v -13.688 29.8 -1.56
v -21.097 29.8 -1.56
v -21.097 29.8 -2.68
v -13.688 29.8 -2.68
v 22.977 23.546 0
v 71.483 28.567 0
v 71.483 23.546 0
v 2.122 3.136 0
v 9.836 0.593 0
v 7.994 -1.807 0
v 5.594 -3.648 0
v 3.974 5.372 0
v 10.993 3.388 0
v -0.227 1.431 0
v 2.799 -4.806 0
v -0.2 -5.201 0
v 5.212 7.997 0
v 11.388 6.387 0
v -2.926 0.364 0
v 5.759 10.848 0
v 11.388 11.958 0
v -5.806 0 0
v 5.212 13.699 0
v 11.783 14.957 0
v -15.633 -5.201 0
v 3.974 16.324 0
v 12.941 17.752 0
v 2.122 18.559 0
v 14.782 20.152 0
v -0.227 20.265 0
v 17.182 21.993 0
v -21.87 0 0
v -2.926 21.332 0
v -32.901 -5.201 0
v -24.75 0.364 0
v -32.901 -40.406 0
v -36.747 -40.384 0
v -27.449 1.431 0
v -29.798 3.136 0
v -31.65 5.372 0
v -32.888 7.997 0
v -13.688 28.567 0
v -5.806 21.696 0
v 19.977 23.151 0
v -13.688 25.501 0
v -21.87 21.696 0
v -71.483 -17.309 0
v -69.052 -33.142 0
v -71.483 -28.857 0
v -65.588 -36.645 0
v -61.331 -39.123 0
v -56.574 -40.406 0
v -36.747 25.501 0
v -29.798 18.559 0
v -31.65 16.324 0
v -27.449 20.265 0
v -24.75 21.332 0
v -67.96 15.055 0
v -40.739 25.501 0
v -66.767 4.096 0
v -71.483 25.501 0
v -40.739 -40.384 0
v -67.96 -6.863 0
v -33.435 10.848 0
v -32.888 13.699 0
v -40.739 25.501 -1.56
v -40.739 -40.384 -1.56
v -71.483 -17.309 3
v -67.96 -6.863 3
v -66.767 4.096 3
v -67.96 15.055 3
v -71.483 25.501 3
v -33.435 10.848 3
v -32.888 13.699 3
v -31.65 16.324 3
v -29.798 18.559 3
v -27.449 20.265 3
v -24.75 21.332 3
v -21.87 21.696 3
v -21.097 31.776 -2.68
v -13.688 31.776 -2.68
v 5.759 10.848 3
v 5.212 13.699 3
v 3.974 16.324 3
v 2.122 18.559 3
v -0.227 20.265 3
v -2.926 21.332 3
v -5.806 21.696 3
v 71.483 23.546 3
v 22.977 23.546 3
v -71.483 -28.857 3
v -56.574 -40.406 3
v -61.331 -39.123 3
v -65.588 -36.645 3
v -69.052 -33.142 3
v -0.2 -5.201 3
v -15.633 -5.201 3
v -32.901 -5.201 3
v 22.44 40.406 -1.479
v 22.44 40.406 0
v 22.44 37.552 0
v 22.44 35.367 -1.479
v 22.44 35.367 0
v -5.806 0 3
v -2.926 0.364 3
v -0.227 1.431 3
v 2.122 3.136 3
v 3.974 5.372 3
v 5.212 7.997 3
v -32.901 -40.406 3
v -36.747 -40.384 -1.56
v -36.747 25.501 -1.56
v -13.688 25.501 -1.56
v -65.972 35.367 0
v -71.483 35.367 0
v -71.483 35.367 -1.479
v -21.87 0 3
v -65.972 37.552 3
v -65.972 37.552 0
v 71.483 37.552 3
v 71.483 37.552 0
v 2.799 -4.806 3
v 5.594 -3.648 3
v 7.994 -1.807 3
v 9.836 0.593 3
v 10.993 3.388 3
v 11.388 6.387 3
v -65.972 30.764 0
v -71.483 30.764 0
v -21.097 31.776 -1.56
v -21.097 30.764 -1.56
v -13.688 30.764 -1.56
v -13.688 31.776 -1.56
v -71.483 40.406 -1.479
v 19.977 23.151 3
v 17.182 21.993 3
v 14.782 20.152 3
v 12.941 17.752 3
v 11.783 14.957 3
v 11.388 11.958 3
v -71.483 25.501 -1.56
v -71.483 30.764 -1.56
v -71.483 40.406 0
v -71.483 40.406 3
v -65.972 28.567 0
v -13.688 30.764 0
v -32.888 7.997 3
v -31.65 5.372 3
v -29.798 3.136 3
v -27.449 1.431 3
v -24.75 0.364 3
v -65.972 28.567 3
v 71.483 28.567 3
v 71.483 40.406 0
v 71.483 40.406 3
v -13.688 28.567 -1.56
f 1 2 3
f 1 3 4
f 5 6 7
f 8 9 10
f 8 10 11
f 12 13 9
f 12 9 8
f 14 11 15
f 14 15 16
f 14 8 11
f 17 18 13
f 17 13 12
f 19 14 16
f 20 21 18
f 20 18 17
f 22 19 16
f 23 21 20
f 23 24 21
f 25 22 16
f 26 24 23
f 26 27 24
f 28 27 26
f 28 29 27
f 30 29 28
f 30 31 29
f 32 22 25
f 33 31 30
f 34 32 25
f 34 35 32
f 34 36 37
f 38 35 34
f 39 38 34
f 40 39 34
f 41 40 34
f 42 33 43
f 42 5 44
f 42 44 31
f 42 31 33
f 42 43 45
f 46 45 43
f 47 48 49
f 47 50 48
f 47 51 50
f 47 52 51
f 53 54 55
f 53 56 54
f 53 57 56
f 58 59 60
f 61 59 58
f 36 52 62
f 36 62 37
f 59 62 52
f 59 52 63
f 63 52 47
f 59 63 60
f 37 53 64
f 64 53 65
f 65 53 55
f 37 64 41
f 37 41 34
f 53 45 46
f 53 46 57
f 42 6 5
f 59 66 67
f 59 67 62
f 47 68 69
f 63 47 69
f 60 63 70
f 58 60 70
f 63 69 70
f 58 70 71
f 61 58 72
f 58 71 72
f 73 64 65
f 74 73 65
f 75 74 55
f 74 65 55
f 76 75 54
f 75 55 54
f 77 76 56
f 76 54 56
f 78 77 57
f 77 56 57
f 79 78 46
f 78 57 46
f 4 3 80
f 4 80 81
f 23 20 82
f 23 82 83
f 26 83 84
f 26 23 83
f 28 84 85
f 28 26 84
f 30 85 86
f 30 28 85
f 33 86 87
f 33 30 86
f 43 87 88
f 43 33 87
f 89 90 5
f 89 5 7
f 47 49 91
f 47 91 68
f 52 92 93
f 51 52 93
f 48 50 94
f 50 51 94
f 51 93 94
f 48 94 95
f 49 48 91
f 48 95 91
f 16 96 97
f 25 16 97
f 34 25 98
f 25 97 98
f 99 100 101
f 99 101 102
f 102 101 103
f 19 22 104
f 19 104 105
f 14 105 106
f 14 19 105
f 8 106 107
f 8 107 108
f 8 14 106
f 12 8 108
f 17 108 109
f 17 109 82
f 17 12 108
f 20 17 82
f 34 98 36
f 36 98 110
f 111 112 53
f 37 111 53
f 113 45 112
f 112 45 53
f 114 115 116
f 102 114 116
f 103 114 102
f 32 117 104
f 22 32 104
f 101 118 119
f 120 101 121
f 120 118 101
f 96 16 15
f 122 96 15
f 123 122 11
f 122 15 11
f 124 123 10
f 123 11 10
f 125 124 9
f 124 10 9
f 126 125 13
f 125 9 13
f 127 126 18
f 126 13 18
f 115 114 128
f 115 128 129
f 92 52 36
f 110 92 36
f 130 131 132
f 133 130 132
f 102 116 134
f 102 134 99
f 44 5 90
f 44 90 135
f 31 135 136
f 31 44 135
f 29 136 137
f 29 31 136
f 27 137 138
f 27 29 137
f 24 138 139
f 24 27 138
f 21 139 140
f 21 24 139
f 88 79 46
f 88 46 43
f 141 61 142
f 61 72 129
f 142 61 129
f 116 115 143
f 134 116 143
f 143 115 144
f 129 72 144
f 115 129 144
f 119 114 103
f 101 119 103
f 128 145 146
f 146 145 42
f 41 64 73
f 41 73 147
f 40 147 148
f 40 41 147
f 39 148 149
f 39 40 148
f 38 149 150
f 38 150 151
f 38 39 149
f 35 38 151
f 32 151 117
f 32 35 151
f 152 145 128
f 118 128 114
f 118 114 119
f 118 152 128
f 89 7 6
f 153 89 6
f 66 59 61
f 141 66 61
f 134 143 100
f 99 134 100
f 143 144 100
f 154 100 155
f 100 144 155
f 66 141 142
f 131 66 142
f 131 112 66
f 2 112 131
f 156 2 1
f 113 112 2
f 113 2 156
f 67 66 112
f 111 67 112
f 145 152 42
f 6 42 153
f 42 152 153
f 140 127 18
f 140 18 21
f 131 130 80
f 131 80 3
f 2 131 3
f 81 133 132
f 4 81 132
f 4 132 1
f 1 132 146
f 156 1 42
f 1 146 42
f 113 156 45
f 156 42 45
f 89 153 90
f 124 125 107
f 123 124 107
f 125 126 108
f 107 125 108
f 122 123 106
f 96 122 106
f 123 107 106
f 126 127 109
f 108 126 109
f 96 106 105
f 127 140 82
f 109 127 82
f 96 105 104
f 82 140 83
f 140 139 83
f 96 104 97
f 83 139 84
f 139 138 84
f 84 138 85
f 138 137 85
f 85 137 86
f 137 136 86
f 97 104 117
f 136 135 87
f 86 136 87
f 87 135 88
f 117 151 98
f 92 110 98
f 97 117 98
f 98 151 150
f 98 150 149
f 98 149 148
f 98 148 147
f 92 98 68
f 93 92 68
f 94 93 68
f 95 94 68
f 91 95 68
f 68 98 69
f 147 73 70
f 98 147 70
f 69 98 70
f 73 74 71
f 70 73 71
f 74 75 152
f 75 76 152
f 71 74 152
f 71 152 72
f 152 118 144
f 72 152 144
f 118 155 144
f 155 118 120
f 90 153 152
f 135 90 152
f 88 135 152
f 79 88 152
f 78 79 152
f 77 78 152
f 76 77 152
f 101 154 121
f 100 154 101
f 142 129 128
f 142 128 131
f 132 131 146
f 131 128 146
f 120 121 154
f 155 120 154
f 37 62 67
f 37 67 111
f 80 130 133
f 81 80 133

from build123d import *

# Parameters (mm, degrees)
F0_W         = 142.9656147957
F0_H         = 80.8112323284
F1_DEPTH     = 3
F2_W         = 137.4550536275
F2_H         = 8.9848991483
F2_W_2       = 60.0944850594
F2_H_2       = 18.4983238578
F3_DEPTH     = 52.3
F4_W         = 39.2408655025
F4_H         = 21.6958951205
F5_DEPTH     = 25
F6_W         = 3.3521875739
F6_H         = 44.7733802721
F6_W_2       = 40.9712046385
F7_DEPTH     = 25
F8_W         = 102.604271844
F8_H         = 18.422623165
F9_DEPTH     = 25
F10_T1_DEPTH = 3
F10_T3_DEPTH = 60.941125497
F12_DEPTH    = 25
F14_DEPTH    = 25
F16_DEPTH    = 25
F17_W        = 93.9226467162
F17_H        = 5.0384774804
F18_DEPTH    = 1.4789979905
F19_W        = 52.2845312953
F19_H        = 2.1970570087
F20_DEPTH    = 0.8268505335
F21_DEPTH    = 0.7327459753
F22_W        = 3.9923638105
F22_H        = 1.5595965087
F23_DEPTH    = 65.8853985369
F24_W        = 7.4088871479
F24_H        = 1.9754432142
F25_DEPTH    = 1.11994287


# Not quite as in the source:
# - a fillet or chamfer that OpenCascade refuses, or shapes differently, is made with other operations: its cross-section is extruded or revolved along the edge and cut away or added


with BuildPart() as f1:
    # F0 (on Top) → F1 (new body)
    with BuildSketch(Plane.XY):
        Rectangle(F0_W, F0_H)
    extrude(amount=F1_DEPTH)

    # F2 (on face) → F3 (cut)
    with BuildSketch(Plane.XY.offset(3)):
        with Locations((2.7552805841, 33.0591509119)):
            Rectangle(F2_W, F2_H)
        with Locations((41.4355648682, 14.2965670675)):
            Rectangle(F2_W_2, F2_H_2)
    extrude(amount=-F3_DEPTH, mode=Mode.SUBTRACT)

    # F4 (on face) → F5 (cut)
    with BuildSketch(Plane.XY.offset(3)):
        with Locations((-13.8379565906, 10.8479475603)):
            Rectangle(F4_W, F4_H)
    extrude(amount=-F5_DEPTH, mode=Mode.SUBTRACT)

    # F6 (on face) → F7 (cut)
    with BuildSketch(Plane.XY.offset(3)):
        Polygon((98.6725464463, 0), (13.7504395097, 0), (13.7504395097, -5.2010240033), (17.1026270837, -5.2010240033), (17.1026270837, -49.9744042754), (13.7504395097, -49.9744042754), (13.7504395097, -55.2418604493), (98.6725464463, -55.2418604493), align=None)
        with Locations((15.4265332967, -27.5877141394)):
            Rectangle(F6_W, F6_H)
        with Locations((-6.7351628095, -27.5877141394)):
            Rectangle(F6_W_2, F6_H)
    extrude(amount=-F7_DEPTH, mode=Mode.SUBTRACT)

    # F8 (on face) → F9 (cut)
    with BuildSketch(Plane.XY.offset(3)):
        with Locations((62.6904582605, -4.1639064439)):
            Rectangle(F8_W, F8_H)
    extrude(amount=-F9_DEPTH, mode=Mode.SUBTRACT)

    # F10: fillet of radius 11.5882250994 on 7 edges, made by hand

    # F10_s2 → F10_t1 (join)
    with BuildSketch(Plane.XY):
        with BuildLine():
            ThreePointArc((22.9765474379, 23.5457289964), (14.7824348882, 20.1516164467), (11.3883223385, 11.957503897))
            Line((11.3883223385, 11.957503897), (11.3883223385, 23.5457289964))
            Line((11.3883223385, 23.5457289964), (22.9765474379, 23.5457289964))
        make_face()
        with BuildLine():
            ThreePointArc((-15.6325400293, -5.2010240033), (-23.826652579, -8.595136553), (-27.2207651287, -16.7892491027))
            Line((-27.2207651287, -16.7892491027), (-27.2207651287, -5.2010240033))
            Line((-27.2207651287, -5.2010240033), (-15.6325400293, -5.2010240033))
        make_face()
        with BuildLine():
            ThreePointArc((-33.4583893418, 10.1076700211), (-30.0642767921, 18.3017825708), (-21.8701642424, 21.6958951205))
            Line((-21.8701642424, 21.6958951205), (-33.4583893418, 21.6958951205))
            Line((-33.4583893418, 21.6958951205), (-33.4583893418, 10.1076700211))
        make_face()
        with BuildLine():
            ThreePointArc((-5.8057489387, 0), (2.388363611, 3.3941125497), (5.7824761607, 11.5882250994))
            Line((5.7824761607, 11.5882250994), (5.7824761607, 0))
            Line((5.7824761607, 0), (-5.8057489387, 0))
        make_face()
        with BuildLine():
            ThreePointArc((-33.4583893418, 11.5882250994), (-30.0642767921, 3.3941125497), (-21.8701642424, 0))
            Line((-21.8701642424, 0), (-33.4583893418, 0))
            Line((-33.4583893418, 0), (-33.4583893418, 11.5882250994))
        make_face()
        with BuildLine():
            ThreePointArc((5.7824761607, 10.1076700211), (2.388363611, 18.3017825708), (-5.8057489387, 21.6958951205))
            Line((-5.8057489387, 21.6958951205), (5.7824761607, 21.6958951205))
            Line((5.7824761607, 21.6958951205), (5.7824761607, 10.1076700211))
        make_face()
    extrude(amount=F10_T1_DEPTH)

    # F10_s4 → F10_t3 (cut)
    with BuildSketch(Plane.XY.offset(-28.9705627485)):
        with BuildLine():
            ThreePointArc((-0.1999027609, -5.2010240033), (7.9942097888, -1.8069114536), (11.3883223385, 6.3872010961))
            Line((11.3883223385, 6.3872010961), (11.3883223385, -5.2010240033))
            Line((11.3883223385, -5.2010240033), (-0.1999027609, -5.2010240033))
        make_face()
    extrude(amount=F10_T3_DEPTH, mode=Mode.SUBTRACT)

    # F11 (on face) → F12 (cut)
    with BuildSketch(Plane.XY.offset(3)):
        with BuildLine():
            Line((-71.4828073978, 25.5012605339), (-71.4828073978, -17.3091441393))
            ThreePointArc((-71.4828073978, -17.3091441393), (-66.7668008007, 4.0960581973), (-71.4828073978, 25.5012605339))
        make_face()
    extrude(amount=-F12_DEPTH, mode=Mode.SUBTRACT)

    # F13 (on face) → F14 (cut)
    with BuildSketch(Plane.XY.offset(3)):
        with BuildLine():
            ThreePointArc((-21.3245461018, -6.6952891353), (-30.1185964093, -13.4662376926), (-27.2207651287, -24.1799503565))
            Line((-27.2207651287, -24.1799503565), (-27.2207651287, -16.7892491027))
            ThreePointArc((-27.2207651287, -16.7892491027), (-25.6387183355, -10.944306275), (-21.3245461018, -6.6952891353))
        make_face()
        with BuildLine():
            ThreePointArc((-27.2207651287, -32.8327932205), (-29.4171017882, -37.101902666), (-32.9005867243, -40.4056161642))
            Line((-32.9005867243, -40.4056161642), (-27.2207651287, -40.4056161642))
            Line((-27.2207651287, -40.4056161642), (-27.2207651287, -32.8327932205))
        make_face()
        with BuildLine():
            ThreePointArc((-56.574376872, -40.4056161642), (-65.5880780241, -36.6447482344), (-71.4828073978, -28.8573801517))
            Line((-71.4828073978, -28.8573801517), (-71.4828073978, -40.4056161642))
            Line((-71.4828073978, -40.4056161642), (-56.574376872, -40.4056161642))
        make_face()
    extrude(amount=-F14_DEPTH, mode=Mode.SUBTRACT)

    # F15 (on face) → F16 (cut)
    with BuildSketch(Plane.XY.offset(3)):
        with BuildLine():
            Line((-32.9005867243, -5.2010240033), (-32.9005867243, -40.4056161642))
            ThreePointArc((-32.9005867243, -40.4056161642), (-29.4171017882, -37.101902666), (-27.2207651287, -32.8327932205))
            Line((-27.2207651287, -32.8327932205), (-27.2207651287, -24.1799503565))
            ThreePointArc((-27.2207651287, -24.1799503565), (-30.1185964093, -13.4662376926), (-21.3245461018, -6.6952891353))
            ThreePointArc((-21.3245461018, -6.6952891353), (-18.5749778542, -5.5808138595), (-15.6325400293, -5.2010240033))
            Line((-15.6325400293, -5.2010240033), (-32.9005867243, -5.2010240033))
        make_face()
    extrude(amount=-F16_DEPTH, mode=Mode.SUBTRACT)

    # F17 (on face) → F18 (join)
    with BuildSketch(Plane(origin=(0, 0, 0), x_dir=(1, 0, 0), z_dir=(0, 0, -1))):
        with Locations((-24.5214840397, -37.886377424)):
            Rectangle(F17_W, F17_H)
    extrude(amount=F18_DEPTH)

    # F19 (on face) → F20 (join)
    with BuildSketch(Plane(origin=(0, 0, 0), x_dir=(1, 0, 0), z_dir=(0, 0, -1))):
        with Locations((-39.829980582, -29.6652298421)):
            Rectangle(F19_W, F19_H)
        Polygon((-71.4828073978, -30.7637583464), (-65.9722462296, -30.7637583464), (-65.9722462296, -28.5667013377), (-13.6877149343, -28.5667013377), (-13.6877149343, -25.5012605339), (-71.4828073978, -25.5012605339), align=None)
    extrude(amount=F20_DEPTH)

    # F21 (add): a face of the model
    f21_faces = [f1.faces().sort_by_distance(p)[0] for p in [
        (-42.5852611661, 28.1325094402, -0.8268505335),
    ]]
    extrude(f21_faces, amount=F21_DEPTH)

    # F22 (on face) → F23 (join)
    with BuildSketch(Plane.XZ.offset(-25.5012605339)):
        with Locations((-38.7431830168, -0.7797982544)):
            Rectangle(F22_W, F22_H)
    extrude(amount=F23_DEPTH)

    # F24 (on face) → F25 (join)
    with BuildSketch(Plane(origin=(0, 0, -1.5595965087), x_dir=(1, 0, 0), z_dir=(0, 0, -1))):
        with Locations((-17.3921585083, -30.787916854)):
            Rectangle(F24_W, F24_H)
    extrude(amount=F25_DEPTH)


solid = f1.part
